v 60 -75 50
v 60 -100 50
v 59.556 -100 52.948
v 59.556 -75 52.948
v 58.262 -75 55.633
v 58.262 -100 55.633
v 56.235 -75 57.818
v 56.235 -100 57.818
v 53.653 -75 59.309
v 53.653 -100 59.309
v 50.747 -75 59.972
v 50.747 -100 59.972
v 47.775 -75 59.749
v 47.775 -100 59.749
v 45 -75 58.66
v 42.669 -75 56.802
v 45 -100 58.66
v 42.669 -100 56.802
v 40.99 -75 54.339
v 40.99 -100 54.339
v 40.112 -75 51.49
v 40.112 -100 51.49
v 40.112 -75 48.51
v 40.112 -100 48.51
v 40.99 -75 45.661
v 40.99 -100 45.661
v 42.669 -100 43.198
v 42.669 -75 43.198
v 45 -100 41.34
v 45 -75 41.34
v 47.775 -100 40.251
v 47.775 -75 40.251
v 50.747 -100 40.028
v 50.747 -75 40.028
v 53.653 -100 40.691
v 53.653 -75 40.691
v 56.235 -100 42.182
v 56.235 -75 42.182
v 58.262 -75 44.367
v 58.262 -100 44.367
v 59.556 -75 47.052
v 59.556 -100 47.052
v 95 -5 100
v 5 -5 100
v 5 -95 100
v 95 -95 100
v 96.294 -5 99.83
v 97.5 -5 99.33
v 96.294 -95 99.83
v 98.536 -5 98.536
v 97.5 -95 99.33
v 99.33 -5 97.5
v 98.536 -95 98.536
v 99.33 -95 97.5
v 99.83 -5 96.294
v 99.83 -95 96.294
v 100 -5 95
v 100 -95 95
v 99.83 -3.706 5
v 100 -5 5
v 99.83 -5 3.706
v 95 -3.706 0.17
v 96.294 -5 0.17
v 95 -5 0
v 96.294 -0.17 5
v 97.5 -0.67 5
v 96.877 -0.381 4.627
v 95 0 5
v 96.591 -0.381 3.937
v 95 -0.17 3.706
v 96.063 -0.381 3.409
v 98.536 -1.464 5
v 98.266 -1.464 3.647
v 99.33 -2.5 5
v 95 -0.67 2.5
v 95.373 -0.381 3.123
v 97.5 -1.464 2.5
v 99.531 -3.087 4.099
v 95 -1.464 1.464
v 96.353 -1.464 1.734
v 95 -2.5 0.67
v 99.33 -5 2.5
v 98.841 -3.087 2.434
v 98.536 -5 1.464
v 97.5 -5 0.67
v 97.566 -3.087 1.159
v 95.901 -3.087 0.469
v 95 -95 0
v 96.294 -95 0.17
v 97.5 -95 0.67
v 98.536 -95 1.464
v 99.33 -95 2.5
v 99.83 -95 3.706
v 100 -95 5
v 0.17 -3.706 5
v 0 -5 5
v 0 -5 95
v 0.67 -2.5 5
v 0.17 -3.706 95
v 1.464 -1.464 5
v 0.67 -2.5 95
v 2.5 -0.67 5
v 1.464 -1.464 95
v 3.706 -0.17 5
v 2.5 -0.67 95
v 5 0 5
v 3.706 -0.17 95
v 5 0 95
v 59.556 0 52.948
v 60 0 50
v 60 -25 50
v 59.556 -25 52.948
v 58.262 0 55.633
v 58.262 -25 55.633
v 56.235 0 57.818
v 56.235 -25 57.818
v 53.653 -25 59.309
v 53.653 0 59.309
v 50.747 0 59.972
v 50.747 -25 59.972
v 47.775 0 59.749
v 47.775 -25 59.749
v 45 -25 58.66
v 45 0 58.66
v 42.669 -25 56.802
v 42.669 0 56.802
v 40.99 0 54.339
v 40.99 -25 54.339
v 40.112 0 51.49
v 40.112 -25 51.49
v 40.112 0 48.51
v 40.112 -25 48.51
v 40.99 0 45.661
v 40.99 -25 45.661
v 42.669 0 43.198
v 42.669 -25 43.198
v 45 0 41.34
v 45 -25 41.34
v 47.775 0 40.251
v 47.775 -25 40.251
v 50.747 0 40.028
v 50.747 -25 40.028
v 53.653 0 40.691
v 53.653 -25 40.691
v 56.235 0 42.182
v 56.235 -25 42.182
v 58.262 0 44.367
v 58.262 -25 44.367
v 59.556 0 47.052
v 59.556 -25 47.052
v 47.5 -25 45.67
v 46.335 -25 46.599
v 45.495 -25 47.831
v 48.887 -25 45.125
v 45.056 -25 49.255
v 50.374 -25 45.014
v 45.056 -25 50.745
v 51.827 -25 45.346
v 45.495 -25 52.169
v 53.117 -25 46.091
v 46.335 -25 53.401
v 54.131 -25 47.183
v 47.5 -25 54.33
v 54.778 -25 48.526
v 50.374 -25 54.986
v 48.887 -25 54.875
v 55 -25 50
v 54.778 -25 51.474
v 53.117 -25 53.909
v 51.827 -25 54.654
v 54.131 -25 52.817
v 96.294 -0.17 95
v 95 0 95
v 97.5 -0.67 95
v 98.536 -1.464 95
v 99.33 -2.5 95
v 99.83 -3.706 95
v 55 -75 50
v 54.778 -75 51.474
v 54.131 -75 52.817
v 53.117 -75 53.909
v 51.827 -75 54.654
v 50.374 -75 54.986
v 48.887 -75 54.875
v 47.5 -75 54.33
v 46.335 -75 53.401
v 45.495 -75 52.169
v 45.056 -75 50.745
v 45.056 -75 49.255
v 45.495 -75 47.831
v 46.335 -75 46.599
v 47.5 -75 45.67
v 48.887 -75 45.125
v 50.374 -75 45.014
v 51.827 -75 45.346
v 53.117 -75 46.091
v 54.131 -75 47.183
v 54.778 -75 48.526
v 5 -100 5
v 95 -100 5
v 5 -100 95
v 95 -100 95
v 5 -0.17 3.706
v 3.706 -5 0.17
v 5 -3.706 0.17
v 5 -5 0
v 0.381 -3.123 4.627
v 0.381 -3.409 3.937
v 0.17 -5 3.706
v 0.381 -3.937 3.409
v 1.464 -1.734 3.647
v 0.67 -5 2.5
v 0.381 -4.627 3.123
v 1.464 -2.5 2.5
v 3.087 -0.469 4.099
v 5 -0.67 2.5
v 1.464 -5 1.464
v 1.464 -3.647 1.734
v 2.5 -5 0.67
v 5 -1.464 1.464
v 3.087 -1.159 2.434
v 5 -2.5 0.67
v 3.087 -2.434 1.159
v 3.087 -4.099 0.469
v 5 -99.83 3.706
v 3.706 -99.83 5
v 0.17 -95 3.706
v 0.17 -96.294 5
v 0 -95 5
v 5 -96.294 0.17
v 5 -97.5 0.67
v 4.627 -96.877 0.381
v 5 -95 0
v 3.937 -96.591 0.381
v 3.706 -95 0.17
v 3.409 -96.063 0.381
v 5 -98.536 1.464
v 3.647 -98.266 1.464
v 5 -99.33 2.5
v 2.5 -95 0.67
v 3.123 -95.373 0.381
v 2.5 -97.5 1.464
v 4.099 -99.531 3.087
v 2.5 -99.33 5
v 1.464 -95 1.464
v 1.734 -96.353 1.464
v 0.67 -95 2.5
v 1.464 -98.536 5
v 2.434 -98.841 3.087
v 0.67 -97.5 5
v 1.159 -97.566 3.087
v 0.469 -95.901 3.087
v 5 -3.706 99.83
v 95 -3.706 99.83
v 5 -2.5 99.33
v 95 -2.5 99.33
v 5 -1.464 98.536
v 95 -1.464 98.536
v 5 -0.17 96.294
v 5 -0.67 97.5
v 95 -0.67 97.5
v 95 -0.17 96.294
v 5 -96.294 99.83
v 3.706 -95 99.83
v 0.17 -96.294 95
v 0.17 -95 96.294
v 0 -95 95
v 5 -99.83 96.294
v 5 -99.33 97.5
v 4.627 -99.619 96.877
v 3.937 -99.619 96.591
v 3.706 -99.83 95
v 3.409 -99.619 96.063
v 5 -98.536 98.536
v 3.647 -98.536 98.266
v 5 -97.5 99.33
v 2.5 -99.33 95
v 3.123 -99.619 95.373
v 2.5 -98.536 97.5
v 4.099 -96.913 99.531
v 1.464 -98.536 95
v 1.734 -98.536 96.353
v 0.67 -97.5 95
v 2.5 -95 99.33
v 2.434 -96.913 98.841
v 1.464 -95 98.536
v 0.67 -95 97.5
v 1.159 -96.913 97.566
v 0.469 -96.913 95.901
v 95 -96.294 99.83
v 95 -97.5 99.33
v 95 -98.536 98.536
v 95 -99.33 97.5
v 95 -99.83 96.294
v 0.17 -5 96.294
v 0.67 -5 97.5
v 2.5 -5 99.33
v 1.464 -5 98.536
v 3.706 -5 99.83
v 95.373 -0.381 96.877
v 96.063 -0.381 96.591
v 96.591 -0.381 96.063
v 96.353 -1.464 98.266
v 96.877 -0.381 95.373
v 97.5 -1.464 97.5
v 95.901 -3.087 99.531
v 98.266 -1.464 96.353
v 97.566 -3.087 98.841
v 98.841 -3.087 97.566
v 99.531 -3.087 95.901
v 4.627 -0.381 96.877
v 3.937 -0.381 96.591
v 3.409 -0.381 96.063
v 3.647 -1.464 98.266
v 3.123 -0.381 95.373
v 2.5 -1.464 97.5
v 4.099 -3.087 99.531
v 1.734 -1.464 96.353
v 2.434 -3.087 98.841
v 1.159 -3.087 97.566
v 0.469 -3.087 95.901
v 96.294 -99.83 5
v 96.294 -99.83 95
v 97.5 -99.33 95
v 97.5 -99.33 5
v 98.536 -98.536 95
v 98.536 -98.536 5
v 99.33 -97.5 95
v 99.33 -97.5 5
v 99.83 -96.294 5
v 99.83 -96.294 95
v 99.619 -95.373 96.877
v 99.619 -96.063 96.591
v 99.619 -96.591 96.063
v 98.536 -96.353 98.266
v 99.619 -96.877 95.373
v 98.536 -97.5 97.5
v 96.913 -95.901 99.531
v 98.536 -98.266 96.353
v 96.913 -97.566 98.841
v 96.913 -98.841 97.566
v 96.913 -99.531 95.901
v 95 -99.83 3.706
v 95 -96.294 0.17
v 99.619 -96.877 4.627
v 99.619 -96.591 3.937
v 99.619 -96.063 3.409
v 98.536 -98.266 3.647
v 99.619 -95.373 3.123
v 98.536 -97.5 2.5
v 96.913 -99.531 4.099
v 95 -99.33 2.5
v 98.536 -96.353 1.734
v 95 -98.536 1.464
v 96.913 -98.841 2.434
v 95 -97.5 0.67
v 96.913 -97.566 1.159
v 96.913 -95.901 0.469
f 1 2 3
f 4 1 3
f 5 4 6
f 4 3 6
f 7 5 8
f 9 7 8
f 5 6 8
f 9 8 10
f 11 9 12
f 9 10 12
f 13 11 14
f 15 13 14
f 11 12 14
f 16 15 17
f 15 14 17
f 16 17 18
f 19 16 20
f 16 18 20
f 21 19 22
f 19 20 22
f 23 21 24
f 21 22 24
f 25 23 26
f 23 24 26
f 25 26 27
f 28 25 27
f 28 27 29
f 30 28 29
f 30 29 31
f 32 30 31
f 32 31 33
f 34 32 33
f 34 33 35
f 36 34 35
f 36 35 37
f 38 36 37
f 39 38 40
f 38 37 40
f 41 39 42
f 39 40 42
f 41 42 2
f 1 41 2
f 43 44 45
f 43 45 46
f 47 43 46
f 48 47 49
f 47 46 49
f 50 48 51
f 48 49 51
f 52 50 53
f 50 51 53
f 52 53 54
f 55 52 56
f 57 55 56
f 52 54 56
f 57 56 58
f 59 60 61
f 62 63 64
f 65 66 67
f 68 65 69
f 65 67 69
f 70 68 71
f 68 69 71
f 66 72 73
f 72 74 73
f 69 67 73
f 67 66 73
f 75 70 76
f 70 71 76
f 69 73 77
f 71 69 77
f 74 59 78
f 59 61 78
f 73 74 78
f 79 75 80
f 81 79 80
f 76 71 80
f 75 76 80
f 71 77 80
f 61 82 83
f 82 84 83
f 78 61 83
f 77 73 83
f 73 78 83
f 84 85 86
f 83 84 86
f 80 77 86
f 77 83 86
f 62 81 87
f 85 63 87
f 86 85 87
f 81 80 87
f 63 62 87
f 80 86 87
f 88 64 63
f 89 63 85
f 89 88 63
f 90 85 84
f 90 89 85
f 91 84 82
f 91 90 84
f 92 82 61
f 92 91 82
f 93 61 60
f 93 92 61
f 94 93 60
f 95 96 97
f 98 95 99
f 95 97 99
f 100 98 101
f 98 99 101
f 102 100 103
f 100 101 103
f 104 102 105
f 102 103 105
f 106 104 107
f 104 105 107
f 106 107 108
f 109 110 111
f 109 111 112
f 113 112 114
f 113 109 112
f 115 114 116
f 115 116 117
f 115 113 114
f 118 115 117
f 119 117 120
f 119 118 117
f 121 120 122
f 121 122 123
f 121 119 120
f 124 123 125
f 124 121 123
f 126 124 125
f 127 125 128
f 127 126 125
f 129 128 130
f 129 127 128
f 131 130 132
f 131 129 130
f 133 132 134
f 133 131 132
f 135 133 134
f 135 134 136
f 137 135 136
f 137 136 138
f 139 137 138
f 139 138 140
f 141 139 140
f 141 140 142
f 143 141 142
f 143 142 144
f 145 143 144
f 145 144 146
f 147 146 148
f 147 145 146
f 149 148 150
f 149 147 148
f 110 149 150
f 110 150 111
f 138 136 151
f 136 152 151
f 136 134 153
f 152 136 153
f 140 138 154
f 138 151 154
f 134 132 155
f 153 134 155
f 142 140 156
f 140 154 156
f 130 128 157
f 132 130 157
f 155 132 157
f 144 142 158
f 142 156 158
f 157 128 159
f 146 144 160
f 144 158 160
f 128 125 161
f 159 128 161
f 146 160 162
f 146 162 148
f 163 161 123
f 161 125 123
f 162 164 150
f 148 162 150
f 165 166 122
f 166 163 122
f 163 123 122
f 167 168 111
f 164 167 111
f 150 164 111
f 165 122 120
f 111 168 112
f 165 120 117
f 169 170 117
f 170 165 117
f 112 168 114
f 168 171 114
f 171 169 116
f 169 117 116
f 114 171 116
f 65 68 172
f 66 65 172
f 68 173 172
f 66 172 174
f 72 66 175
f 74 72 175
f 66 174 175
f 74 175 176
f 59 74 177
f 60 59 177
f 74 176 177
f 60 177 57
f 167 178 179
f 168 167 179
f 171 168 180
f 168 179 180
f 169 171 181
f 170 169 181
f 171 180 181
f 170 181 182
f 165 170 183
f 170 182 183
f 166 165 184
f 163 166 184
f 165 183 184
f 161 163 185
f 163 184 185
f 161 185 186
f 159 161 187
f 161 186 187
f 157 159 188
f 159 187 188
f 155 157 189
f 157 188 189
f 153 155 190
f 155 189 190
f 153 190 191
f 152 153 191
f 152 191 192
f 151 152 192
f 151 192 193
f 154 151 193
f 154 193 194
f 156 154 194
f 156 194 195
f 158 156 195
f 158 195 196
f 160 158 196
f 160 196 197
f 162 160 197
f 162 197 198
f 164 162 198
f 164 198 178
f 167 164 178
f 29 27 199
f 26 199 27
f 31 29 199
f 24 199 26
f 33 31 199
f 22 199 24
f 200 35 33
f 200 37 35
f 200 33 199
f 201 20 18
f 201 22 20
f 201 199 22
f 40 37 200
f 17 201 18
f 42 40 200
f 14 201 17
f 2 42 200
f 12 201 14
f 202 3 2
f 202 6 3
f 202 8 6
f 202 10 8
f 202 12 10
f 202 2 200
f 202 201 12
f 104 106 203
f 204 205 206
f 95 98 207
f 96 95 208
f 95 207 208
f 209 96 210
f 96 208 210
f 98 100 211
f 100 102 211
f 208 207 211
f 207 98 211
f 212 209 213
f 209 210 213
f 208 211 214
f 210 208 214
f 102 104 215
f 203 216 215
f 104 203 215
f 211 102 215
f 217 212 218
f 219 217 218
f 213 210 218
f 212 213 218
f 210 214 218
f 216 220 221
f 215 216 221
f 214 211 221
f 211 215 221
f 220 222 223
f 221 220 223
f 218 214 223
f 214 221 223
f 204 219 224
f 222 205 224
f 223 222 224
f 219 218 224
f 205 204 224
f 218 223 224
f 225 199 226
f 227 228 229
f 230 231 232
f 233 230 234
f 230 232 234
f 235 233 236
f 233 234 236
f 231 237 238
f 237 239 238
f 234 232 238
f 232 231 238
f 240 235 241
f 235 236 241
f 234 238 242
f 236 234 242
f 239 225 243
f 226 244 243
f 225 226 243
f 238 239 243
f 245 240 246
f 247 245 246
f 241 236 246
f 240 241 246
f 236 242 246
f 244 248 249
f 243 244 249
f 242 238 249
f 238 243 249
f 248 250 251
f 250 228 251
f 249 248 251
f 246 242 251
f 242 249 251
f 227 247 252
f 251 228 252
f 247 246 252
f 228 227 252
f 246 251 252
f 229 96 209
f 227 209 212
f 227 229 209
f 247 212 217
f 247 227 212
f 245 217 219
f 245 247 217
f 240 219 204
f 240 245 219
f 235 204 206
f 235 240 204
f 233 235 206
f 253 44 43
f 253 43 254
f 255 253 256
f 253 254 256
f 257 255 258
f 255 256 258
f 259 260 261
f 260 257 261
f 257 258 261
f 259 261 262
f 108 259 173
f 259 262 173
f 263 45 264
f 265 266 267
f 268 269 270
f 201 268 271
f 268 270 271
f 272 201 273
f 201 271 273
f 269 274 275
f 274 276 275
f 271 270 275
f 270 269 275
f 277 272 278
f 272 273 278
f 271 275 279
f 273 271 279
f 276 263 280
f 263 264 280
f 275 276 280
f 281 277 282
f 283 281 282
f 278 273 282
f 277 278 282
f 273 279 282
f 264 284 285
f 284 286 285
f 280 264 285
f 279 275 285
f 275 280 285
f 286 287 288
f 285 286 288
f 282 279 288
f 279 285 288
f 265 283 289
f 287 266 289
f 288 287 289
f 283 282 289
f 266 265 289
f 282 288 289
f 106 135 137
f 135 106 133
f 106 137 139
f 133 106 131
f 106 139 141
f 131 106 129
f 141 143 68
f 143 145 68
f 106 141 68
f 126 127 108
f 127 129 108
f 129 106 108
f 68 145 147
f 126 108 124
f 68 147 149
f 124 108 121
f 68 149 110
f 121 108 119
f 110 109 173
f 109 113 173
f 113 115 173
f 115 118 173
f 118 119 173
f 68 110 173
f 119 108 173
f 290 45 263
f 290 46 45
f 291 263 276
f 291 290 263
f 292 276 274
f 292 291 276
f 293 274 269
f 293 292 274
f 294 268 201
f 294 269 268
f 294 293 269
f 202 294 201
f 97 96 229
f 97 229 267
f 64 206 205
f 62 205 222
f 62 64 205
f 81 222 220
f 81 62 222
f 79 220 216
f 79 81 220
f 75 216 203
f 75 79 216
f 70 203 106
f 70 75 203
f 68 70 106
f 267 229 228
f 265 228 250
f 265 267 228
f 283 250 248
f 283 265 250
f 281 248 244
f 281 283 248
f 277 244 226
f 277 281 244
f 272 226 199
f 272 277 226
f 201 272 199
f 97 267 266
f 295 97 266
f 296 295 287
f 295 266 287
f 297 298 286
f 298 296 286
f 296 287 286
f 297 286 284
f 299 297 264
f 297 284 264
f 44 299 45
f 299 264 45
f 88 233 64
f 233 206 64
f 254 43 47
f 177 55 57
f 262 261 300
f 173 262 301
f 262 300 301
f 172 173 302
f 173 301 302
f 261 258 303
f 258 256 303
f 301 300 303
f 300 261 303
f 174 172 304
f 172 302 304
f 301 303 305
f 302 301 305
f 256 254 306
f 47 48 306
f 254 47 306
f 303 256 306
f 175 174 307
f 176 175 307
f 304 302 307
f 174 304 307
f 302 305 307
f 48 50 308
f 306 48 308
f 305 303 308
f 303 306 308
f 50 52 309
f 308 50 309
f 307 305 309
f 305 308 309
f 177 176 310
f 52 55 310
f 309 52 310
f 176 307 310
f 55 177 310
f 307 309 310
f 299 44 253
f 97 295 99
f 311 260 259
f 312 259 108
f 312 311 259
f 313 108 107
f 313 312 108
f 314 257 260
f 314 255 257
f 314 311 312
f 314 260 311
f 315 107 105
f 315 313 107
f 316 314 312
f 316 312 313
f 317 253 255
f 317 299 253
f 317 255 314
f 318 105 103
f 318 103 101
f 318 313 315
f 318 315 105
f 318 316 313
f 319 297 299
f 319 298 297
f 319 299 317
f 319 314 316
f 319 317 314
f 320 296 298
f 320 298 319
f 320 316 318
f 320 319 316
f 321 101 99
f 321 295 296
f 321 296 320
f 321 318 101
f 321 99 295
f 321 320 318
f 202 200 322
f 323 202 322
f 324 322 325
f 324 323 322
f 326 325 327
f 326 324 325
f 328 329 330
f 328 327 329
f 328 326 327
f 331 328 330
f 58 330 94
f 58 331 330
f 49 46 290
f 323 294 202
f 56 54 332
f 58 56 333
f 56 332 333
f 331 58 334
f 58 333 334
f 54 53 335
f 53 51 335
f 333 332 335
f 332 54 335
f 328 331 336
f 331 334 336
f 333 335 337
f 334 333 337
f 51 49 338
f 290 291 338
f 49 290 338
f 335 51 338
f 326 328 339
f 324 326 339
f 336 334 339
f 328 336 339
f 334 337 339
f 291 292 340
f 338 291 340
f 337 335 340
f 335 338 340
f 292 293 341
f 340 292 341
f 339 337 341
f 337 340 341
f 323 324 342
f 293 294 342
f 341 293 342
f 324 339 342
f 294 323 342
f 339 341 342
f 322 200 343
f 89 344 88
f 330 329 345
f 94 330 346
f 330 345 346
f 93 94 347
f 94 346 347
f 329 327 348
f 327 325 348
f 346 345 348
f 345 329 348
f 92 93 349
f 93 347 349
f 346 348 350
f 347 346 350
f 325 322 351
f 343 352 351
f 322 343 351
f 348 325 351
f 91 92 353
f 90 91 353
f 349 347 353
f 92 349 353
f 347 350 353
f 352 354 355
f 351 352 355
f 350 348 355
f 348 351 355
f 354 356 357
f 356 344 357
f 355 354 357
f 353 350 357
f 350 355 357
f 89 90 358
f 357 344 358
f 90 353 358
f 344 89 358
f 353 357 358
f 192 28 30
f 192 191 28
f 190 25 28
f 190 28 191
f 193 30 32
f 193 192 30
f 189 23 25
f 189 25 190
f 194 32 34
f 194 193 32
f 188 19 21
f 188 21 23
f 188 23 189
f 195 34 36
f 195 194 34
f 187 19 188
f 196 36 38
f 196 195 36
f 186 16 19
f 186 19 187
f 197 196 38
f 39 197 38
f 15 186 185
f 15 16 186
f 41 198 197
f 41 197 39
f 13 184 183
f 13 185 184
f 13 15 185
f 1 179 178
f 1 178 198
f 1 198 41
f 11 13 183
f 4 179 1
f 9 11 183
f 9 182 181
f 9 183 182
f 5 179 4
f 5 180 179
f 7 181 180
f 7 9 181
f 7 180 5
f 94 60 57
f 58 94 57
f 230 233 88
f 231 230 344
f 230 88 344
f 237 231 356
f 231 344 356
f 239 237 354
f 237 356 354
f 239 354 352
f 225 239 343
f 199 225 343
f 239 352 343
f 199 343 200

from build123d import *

# Parameters (mm, degrees)
F0_W     = 100
F0_H     = 100
F1_DEPTH = 100
F2_R     = 5
F3_DEPTH = 100
F5_R     = 10
F6_DEPTH = 25
F7_R     = 5


# Not quite as in the source:
# - a pattern or mirror of a feature is missing from the dataset's text; its kind, count and spacing are read off the source's solid


with BuildPart() as f1:
    # F0 (on Front) → F1 (new body)
    with BuildSketch(Plane.XZ):
        with Locations((50, 50)):
            Rectangle(F0_W, F0_H)
    extrude(amount=F1_DEPTH)

    # F2 (on face) → F3 (cut)
    with BuildSketch(Plane.XZ.offset(100)):
        with Locations((50, 50)):
            Circle(F2_R)
    extrude(amount=-F3_DEPTH, mode=Mode.SUBTRACT)

    # F5 (on face) → F6 (cut)
    with BuildSketch(Plane.XZ.offset(100)):
        with Locations((50, 50)):
            Circle(F5_R)
    f6 = extrude(amount=-F6_DEPTH, mode=Mode.SUBTRACT)

    # F6_copies: F6 across plane
    add(f6.mirror(Plane.ZX.offset(-50)), mode=Mode.SUBTRACT)

    # F7
    f7_edges = [f1.edges().sort_by_distance(p)[0] for p in [
        (0, -50, 100),
        (50, -100, 100),
        (100, -50, 100),
        (50, 0, 100),
        (0, -100, 50),
        (50, -100, 0),
        (100, -100, 50),
        (100, -50, 0),
        (100, 0, 50),
        (50, 0, 0),
        (0, 0, 50),
        (0, -50, 0),
    ]]
    fillet(f7_edges, radius=F7_R)


solid = f1.part
